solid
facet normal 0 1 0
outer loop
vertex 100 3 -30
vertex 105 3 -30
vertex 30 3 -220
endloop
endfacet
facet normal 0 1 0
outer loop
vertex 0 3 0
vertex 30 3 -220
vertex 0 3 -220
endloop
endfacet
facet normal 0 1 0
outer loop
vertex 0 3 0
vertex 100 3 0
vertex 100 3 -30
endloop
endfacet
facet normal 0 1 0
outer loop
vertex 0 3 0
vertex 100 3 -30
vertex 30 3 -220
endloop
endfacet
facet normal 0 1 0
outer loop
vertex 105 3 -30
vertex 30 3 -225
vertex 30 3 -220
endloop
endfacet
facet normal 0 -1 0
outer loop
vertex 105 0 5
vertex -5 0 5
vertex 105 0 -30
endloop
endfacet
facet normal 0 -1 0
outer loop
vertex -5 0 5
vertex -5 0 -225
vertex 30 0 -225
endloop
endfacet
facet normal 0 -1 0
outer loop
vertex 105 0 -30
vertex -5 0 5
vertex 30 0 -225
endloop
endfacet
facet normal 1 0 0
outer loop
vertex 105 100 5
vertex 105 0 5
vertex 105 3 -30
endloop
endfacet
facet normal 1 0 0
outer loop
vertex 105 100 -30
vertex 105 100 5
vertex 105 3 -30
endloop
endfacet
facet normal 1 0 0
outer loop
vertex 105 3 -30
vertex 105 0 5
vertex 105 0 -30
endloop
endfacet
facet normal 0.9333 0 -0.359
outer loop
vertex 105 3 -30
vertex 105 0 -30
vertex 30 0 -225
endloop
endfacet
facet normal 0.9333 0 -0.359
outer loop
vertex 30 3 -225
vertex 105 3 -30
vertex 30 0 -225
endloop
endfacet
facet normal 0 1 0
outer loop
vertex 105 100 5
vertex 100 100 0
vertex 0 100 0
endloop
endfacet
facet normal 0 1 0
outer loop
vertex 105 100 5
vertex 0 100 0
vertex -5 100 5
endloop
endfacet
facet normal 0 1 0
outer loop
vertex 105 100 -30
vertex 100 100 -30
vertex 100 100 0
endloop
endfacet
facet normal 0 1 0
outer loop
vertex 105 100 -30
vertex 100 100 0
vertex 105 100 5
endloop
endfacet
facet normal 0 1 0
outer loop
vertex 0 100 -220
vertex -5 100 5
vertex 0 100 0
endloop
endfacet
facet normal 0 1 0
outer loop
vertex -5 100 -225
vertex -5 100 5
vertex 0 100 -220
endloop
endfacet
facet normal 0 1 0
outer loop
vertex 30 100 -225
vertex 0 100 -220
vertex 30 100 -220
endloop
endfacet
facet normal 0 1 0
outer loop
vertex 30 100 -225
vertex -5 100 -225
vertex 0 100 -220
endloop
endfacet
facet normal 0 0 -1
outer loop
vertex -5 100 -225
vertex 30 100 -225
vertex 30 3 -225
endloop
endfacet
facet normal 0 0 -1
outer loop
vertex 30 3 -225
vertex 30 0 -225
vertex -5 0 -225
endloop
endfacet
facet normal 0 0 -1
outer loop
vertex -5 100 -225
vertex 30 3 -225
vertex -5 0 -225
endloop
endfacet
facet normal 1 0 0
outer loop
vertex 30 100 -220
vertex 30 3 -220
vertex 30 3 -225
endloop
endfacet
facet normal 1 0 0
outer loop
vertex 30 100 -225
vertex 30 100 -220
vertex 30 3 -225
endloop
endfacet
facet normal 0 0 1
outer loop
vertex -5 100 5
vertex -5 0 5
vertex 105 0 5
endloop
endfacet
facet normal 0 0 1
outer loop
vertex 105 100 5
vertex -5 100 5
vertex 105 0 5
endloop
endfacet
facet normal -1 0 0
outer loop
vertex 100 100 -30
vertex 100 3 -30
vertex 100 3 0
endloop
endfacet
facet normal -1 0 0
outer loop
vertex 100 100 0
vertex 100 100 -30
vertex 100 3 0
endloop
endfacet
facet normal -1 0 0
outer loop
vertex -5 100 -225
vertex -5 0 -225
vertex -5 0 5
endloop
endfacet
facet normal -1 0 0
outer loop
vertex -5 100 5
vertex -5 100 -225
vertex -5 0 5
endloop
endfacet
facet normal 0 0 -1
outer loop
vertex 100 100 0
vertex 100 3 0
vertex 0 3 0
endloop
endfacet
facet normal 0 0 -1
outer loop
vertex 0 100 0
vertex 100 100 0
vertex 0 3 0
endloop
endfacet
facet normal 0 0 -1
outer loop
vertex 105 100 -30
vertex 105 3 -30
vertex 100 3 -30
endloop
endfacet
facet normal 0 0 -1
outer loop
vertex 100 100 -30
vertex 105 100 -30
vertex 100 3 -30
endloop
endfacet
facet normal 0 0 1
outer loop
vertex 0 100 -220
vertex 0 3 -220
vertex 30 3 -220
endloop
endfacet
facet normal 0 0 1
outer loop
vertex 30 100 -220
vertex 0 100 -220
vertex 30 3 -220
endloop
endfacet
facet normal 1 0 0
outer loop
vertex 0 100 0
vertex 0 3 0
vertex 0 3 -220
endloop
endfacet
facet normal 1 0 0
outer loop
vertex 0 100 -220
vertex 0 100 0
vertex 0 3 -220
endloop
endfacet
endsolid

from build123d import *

# Parameters (mm, degrees)
ESTRUSIONE_ESTRUSIONE1_DEPTH = 100
ESTRUSIONE_ESTRUSIONE2_DEPTH = 3


with BuildPart() as part:
    # Schizzo1 → Estrusione-Estrusione1 (new body)
    with BuildSketch(Plane(origin=(0, 0, 0), x_dir=(1, 0, 0), z_dir=(0, 1, 0))):
        Polygon((100, 0), (0, 0), (0, 220), (30, 220), (30, 225), (-5, 225), (-5, -5), (105, -5), (105, 30), (100, 30), align=None)
    extrude(amount=ESTRUSIONE_ESTRUSIONE1_DEPTH)

    # Schizzo2 → Estrusione-Estrusione2 (add)
    with BuildSketch(Plane.XZ):
        Polygon((30, -225), (-5, -225), (-5, 5), (105, 5), (105, -30), align=None)
    extrude(amount=-ESTRUSIONE_ESTRUSIONE2_DEPTH)


solid = part.part
